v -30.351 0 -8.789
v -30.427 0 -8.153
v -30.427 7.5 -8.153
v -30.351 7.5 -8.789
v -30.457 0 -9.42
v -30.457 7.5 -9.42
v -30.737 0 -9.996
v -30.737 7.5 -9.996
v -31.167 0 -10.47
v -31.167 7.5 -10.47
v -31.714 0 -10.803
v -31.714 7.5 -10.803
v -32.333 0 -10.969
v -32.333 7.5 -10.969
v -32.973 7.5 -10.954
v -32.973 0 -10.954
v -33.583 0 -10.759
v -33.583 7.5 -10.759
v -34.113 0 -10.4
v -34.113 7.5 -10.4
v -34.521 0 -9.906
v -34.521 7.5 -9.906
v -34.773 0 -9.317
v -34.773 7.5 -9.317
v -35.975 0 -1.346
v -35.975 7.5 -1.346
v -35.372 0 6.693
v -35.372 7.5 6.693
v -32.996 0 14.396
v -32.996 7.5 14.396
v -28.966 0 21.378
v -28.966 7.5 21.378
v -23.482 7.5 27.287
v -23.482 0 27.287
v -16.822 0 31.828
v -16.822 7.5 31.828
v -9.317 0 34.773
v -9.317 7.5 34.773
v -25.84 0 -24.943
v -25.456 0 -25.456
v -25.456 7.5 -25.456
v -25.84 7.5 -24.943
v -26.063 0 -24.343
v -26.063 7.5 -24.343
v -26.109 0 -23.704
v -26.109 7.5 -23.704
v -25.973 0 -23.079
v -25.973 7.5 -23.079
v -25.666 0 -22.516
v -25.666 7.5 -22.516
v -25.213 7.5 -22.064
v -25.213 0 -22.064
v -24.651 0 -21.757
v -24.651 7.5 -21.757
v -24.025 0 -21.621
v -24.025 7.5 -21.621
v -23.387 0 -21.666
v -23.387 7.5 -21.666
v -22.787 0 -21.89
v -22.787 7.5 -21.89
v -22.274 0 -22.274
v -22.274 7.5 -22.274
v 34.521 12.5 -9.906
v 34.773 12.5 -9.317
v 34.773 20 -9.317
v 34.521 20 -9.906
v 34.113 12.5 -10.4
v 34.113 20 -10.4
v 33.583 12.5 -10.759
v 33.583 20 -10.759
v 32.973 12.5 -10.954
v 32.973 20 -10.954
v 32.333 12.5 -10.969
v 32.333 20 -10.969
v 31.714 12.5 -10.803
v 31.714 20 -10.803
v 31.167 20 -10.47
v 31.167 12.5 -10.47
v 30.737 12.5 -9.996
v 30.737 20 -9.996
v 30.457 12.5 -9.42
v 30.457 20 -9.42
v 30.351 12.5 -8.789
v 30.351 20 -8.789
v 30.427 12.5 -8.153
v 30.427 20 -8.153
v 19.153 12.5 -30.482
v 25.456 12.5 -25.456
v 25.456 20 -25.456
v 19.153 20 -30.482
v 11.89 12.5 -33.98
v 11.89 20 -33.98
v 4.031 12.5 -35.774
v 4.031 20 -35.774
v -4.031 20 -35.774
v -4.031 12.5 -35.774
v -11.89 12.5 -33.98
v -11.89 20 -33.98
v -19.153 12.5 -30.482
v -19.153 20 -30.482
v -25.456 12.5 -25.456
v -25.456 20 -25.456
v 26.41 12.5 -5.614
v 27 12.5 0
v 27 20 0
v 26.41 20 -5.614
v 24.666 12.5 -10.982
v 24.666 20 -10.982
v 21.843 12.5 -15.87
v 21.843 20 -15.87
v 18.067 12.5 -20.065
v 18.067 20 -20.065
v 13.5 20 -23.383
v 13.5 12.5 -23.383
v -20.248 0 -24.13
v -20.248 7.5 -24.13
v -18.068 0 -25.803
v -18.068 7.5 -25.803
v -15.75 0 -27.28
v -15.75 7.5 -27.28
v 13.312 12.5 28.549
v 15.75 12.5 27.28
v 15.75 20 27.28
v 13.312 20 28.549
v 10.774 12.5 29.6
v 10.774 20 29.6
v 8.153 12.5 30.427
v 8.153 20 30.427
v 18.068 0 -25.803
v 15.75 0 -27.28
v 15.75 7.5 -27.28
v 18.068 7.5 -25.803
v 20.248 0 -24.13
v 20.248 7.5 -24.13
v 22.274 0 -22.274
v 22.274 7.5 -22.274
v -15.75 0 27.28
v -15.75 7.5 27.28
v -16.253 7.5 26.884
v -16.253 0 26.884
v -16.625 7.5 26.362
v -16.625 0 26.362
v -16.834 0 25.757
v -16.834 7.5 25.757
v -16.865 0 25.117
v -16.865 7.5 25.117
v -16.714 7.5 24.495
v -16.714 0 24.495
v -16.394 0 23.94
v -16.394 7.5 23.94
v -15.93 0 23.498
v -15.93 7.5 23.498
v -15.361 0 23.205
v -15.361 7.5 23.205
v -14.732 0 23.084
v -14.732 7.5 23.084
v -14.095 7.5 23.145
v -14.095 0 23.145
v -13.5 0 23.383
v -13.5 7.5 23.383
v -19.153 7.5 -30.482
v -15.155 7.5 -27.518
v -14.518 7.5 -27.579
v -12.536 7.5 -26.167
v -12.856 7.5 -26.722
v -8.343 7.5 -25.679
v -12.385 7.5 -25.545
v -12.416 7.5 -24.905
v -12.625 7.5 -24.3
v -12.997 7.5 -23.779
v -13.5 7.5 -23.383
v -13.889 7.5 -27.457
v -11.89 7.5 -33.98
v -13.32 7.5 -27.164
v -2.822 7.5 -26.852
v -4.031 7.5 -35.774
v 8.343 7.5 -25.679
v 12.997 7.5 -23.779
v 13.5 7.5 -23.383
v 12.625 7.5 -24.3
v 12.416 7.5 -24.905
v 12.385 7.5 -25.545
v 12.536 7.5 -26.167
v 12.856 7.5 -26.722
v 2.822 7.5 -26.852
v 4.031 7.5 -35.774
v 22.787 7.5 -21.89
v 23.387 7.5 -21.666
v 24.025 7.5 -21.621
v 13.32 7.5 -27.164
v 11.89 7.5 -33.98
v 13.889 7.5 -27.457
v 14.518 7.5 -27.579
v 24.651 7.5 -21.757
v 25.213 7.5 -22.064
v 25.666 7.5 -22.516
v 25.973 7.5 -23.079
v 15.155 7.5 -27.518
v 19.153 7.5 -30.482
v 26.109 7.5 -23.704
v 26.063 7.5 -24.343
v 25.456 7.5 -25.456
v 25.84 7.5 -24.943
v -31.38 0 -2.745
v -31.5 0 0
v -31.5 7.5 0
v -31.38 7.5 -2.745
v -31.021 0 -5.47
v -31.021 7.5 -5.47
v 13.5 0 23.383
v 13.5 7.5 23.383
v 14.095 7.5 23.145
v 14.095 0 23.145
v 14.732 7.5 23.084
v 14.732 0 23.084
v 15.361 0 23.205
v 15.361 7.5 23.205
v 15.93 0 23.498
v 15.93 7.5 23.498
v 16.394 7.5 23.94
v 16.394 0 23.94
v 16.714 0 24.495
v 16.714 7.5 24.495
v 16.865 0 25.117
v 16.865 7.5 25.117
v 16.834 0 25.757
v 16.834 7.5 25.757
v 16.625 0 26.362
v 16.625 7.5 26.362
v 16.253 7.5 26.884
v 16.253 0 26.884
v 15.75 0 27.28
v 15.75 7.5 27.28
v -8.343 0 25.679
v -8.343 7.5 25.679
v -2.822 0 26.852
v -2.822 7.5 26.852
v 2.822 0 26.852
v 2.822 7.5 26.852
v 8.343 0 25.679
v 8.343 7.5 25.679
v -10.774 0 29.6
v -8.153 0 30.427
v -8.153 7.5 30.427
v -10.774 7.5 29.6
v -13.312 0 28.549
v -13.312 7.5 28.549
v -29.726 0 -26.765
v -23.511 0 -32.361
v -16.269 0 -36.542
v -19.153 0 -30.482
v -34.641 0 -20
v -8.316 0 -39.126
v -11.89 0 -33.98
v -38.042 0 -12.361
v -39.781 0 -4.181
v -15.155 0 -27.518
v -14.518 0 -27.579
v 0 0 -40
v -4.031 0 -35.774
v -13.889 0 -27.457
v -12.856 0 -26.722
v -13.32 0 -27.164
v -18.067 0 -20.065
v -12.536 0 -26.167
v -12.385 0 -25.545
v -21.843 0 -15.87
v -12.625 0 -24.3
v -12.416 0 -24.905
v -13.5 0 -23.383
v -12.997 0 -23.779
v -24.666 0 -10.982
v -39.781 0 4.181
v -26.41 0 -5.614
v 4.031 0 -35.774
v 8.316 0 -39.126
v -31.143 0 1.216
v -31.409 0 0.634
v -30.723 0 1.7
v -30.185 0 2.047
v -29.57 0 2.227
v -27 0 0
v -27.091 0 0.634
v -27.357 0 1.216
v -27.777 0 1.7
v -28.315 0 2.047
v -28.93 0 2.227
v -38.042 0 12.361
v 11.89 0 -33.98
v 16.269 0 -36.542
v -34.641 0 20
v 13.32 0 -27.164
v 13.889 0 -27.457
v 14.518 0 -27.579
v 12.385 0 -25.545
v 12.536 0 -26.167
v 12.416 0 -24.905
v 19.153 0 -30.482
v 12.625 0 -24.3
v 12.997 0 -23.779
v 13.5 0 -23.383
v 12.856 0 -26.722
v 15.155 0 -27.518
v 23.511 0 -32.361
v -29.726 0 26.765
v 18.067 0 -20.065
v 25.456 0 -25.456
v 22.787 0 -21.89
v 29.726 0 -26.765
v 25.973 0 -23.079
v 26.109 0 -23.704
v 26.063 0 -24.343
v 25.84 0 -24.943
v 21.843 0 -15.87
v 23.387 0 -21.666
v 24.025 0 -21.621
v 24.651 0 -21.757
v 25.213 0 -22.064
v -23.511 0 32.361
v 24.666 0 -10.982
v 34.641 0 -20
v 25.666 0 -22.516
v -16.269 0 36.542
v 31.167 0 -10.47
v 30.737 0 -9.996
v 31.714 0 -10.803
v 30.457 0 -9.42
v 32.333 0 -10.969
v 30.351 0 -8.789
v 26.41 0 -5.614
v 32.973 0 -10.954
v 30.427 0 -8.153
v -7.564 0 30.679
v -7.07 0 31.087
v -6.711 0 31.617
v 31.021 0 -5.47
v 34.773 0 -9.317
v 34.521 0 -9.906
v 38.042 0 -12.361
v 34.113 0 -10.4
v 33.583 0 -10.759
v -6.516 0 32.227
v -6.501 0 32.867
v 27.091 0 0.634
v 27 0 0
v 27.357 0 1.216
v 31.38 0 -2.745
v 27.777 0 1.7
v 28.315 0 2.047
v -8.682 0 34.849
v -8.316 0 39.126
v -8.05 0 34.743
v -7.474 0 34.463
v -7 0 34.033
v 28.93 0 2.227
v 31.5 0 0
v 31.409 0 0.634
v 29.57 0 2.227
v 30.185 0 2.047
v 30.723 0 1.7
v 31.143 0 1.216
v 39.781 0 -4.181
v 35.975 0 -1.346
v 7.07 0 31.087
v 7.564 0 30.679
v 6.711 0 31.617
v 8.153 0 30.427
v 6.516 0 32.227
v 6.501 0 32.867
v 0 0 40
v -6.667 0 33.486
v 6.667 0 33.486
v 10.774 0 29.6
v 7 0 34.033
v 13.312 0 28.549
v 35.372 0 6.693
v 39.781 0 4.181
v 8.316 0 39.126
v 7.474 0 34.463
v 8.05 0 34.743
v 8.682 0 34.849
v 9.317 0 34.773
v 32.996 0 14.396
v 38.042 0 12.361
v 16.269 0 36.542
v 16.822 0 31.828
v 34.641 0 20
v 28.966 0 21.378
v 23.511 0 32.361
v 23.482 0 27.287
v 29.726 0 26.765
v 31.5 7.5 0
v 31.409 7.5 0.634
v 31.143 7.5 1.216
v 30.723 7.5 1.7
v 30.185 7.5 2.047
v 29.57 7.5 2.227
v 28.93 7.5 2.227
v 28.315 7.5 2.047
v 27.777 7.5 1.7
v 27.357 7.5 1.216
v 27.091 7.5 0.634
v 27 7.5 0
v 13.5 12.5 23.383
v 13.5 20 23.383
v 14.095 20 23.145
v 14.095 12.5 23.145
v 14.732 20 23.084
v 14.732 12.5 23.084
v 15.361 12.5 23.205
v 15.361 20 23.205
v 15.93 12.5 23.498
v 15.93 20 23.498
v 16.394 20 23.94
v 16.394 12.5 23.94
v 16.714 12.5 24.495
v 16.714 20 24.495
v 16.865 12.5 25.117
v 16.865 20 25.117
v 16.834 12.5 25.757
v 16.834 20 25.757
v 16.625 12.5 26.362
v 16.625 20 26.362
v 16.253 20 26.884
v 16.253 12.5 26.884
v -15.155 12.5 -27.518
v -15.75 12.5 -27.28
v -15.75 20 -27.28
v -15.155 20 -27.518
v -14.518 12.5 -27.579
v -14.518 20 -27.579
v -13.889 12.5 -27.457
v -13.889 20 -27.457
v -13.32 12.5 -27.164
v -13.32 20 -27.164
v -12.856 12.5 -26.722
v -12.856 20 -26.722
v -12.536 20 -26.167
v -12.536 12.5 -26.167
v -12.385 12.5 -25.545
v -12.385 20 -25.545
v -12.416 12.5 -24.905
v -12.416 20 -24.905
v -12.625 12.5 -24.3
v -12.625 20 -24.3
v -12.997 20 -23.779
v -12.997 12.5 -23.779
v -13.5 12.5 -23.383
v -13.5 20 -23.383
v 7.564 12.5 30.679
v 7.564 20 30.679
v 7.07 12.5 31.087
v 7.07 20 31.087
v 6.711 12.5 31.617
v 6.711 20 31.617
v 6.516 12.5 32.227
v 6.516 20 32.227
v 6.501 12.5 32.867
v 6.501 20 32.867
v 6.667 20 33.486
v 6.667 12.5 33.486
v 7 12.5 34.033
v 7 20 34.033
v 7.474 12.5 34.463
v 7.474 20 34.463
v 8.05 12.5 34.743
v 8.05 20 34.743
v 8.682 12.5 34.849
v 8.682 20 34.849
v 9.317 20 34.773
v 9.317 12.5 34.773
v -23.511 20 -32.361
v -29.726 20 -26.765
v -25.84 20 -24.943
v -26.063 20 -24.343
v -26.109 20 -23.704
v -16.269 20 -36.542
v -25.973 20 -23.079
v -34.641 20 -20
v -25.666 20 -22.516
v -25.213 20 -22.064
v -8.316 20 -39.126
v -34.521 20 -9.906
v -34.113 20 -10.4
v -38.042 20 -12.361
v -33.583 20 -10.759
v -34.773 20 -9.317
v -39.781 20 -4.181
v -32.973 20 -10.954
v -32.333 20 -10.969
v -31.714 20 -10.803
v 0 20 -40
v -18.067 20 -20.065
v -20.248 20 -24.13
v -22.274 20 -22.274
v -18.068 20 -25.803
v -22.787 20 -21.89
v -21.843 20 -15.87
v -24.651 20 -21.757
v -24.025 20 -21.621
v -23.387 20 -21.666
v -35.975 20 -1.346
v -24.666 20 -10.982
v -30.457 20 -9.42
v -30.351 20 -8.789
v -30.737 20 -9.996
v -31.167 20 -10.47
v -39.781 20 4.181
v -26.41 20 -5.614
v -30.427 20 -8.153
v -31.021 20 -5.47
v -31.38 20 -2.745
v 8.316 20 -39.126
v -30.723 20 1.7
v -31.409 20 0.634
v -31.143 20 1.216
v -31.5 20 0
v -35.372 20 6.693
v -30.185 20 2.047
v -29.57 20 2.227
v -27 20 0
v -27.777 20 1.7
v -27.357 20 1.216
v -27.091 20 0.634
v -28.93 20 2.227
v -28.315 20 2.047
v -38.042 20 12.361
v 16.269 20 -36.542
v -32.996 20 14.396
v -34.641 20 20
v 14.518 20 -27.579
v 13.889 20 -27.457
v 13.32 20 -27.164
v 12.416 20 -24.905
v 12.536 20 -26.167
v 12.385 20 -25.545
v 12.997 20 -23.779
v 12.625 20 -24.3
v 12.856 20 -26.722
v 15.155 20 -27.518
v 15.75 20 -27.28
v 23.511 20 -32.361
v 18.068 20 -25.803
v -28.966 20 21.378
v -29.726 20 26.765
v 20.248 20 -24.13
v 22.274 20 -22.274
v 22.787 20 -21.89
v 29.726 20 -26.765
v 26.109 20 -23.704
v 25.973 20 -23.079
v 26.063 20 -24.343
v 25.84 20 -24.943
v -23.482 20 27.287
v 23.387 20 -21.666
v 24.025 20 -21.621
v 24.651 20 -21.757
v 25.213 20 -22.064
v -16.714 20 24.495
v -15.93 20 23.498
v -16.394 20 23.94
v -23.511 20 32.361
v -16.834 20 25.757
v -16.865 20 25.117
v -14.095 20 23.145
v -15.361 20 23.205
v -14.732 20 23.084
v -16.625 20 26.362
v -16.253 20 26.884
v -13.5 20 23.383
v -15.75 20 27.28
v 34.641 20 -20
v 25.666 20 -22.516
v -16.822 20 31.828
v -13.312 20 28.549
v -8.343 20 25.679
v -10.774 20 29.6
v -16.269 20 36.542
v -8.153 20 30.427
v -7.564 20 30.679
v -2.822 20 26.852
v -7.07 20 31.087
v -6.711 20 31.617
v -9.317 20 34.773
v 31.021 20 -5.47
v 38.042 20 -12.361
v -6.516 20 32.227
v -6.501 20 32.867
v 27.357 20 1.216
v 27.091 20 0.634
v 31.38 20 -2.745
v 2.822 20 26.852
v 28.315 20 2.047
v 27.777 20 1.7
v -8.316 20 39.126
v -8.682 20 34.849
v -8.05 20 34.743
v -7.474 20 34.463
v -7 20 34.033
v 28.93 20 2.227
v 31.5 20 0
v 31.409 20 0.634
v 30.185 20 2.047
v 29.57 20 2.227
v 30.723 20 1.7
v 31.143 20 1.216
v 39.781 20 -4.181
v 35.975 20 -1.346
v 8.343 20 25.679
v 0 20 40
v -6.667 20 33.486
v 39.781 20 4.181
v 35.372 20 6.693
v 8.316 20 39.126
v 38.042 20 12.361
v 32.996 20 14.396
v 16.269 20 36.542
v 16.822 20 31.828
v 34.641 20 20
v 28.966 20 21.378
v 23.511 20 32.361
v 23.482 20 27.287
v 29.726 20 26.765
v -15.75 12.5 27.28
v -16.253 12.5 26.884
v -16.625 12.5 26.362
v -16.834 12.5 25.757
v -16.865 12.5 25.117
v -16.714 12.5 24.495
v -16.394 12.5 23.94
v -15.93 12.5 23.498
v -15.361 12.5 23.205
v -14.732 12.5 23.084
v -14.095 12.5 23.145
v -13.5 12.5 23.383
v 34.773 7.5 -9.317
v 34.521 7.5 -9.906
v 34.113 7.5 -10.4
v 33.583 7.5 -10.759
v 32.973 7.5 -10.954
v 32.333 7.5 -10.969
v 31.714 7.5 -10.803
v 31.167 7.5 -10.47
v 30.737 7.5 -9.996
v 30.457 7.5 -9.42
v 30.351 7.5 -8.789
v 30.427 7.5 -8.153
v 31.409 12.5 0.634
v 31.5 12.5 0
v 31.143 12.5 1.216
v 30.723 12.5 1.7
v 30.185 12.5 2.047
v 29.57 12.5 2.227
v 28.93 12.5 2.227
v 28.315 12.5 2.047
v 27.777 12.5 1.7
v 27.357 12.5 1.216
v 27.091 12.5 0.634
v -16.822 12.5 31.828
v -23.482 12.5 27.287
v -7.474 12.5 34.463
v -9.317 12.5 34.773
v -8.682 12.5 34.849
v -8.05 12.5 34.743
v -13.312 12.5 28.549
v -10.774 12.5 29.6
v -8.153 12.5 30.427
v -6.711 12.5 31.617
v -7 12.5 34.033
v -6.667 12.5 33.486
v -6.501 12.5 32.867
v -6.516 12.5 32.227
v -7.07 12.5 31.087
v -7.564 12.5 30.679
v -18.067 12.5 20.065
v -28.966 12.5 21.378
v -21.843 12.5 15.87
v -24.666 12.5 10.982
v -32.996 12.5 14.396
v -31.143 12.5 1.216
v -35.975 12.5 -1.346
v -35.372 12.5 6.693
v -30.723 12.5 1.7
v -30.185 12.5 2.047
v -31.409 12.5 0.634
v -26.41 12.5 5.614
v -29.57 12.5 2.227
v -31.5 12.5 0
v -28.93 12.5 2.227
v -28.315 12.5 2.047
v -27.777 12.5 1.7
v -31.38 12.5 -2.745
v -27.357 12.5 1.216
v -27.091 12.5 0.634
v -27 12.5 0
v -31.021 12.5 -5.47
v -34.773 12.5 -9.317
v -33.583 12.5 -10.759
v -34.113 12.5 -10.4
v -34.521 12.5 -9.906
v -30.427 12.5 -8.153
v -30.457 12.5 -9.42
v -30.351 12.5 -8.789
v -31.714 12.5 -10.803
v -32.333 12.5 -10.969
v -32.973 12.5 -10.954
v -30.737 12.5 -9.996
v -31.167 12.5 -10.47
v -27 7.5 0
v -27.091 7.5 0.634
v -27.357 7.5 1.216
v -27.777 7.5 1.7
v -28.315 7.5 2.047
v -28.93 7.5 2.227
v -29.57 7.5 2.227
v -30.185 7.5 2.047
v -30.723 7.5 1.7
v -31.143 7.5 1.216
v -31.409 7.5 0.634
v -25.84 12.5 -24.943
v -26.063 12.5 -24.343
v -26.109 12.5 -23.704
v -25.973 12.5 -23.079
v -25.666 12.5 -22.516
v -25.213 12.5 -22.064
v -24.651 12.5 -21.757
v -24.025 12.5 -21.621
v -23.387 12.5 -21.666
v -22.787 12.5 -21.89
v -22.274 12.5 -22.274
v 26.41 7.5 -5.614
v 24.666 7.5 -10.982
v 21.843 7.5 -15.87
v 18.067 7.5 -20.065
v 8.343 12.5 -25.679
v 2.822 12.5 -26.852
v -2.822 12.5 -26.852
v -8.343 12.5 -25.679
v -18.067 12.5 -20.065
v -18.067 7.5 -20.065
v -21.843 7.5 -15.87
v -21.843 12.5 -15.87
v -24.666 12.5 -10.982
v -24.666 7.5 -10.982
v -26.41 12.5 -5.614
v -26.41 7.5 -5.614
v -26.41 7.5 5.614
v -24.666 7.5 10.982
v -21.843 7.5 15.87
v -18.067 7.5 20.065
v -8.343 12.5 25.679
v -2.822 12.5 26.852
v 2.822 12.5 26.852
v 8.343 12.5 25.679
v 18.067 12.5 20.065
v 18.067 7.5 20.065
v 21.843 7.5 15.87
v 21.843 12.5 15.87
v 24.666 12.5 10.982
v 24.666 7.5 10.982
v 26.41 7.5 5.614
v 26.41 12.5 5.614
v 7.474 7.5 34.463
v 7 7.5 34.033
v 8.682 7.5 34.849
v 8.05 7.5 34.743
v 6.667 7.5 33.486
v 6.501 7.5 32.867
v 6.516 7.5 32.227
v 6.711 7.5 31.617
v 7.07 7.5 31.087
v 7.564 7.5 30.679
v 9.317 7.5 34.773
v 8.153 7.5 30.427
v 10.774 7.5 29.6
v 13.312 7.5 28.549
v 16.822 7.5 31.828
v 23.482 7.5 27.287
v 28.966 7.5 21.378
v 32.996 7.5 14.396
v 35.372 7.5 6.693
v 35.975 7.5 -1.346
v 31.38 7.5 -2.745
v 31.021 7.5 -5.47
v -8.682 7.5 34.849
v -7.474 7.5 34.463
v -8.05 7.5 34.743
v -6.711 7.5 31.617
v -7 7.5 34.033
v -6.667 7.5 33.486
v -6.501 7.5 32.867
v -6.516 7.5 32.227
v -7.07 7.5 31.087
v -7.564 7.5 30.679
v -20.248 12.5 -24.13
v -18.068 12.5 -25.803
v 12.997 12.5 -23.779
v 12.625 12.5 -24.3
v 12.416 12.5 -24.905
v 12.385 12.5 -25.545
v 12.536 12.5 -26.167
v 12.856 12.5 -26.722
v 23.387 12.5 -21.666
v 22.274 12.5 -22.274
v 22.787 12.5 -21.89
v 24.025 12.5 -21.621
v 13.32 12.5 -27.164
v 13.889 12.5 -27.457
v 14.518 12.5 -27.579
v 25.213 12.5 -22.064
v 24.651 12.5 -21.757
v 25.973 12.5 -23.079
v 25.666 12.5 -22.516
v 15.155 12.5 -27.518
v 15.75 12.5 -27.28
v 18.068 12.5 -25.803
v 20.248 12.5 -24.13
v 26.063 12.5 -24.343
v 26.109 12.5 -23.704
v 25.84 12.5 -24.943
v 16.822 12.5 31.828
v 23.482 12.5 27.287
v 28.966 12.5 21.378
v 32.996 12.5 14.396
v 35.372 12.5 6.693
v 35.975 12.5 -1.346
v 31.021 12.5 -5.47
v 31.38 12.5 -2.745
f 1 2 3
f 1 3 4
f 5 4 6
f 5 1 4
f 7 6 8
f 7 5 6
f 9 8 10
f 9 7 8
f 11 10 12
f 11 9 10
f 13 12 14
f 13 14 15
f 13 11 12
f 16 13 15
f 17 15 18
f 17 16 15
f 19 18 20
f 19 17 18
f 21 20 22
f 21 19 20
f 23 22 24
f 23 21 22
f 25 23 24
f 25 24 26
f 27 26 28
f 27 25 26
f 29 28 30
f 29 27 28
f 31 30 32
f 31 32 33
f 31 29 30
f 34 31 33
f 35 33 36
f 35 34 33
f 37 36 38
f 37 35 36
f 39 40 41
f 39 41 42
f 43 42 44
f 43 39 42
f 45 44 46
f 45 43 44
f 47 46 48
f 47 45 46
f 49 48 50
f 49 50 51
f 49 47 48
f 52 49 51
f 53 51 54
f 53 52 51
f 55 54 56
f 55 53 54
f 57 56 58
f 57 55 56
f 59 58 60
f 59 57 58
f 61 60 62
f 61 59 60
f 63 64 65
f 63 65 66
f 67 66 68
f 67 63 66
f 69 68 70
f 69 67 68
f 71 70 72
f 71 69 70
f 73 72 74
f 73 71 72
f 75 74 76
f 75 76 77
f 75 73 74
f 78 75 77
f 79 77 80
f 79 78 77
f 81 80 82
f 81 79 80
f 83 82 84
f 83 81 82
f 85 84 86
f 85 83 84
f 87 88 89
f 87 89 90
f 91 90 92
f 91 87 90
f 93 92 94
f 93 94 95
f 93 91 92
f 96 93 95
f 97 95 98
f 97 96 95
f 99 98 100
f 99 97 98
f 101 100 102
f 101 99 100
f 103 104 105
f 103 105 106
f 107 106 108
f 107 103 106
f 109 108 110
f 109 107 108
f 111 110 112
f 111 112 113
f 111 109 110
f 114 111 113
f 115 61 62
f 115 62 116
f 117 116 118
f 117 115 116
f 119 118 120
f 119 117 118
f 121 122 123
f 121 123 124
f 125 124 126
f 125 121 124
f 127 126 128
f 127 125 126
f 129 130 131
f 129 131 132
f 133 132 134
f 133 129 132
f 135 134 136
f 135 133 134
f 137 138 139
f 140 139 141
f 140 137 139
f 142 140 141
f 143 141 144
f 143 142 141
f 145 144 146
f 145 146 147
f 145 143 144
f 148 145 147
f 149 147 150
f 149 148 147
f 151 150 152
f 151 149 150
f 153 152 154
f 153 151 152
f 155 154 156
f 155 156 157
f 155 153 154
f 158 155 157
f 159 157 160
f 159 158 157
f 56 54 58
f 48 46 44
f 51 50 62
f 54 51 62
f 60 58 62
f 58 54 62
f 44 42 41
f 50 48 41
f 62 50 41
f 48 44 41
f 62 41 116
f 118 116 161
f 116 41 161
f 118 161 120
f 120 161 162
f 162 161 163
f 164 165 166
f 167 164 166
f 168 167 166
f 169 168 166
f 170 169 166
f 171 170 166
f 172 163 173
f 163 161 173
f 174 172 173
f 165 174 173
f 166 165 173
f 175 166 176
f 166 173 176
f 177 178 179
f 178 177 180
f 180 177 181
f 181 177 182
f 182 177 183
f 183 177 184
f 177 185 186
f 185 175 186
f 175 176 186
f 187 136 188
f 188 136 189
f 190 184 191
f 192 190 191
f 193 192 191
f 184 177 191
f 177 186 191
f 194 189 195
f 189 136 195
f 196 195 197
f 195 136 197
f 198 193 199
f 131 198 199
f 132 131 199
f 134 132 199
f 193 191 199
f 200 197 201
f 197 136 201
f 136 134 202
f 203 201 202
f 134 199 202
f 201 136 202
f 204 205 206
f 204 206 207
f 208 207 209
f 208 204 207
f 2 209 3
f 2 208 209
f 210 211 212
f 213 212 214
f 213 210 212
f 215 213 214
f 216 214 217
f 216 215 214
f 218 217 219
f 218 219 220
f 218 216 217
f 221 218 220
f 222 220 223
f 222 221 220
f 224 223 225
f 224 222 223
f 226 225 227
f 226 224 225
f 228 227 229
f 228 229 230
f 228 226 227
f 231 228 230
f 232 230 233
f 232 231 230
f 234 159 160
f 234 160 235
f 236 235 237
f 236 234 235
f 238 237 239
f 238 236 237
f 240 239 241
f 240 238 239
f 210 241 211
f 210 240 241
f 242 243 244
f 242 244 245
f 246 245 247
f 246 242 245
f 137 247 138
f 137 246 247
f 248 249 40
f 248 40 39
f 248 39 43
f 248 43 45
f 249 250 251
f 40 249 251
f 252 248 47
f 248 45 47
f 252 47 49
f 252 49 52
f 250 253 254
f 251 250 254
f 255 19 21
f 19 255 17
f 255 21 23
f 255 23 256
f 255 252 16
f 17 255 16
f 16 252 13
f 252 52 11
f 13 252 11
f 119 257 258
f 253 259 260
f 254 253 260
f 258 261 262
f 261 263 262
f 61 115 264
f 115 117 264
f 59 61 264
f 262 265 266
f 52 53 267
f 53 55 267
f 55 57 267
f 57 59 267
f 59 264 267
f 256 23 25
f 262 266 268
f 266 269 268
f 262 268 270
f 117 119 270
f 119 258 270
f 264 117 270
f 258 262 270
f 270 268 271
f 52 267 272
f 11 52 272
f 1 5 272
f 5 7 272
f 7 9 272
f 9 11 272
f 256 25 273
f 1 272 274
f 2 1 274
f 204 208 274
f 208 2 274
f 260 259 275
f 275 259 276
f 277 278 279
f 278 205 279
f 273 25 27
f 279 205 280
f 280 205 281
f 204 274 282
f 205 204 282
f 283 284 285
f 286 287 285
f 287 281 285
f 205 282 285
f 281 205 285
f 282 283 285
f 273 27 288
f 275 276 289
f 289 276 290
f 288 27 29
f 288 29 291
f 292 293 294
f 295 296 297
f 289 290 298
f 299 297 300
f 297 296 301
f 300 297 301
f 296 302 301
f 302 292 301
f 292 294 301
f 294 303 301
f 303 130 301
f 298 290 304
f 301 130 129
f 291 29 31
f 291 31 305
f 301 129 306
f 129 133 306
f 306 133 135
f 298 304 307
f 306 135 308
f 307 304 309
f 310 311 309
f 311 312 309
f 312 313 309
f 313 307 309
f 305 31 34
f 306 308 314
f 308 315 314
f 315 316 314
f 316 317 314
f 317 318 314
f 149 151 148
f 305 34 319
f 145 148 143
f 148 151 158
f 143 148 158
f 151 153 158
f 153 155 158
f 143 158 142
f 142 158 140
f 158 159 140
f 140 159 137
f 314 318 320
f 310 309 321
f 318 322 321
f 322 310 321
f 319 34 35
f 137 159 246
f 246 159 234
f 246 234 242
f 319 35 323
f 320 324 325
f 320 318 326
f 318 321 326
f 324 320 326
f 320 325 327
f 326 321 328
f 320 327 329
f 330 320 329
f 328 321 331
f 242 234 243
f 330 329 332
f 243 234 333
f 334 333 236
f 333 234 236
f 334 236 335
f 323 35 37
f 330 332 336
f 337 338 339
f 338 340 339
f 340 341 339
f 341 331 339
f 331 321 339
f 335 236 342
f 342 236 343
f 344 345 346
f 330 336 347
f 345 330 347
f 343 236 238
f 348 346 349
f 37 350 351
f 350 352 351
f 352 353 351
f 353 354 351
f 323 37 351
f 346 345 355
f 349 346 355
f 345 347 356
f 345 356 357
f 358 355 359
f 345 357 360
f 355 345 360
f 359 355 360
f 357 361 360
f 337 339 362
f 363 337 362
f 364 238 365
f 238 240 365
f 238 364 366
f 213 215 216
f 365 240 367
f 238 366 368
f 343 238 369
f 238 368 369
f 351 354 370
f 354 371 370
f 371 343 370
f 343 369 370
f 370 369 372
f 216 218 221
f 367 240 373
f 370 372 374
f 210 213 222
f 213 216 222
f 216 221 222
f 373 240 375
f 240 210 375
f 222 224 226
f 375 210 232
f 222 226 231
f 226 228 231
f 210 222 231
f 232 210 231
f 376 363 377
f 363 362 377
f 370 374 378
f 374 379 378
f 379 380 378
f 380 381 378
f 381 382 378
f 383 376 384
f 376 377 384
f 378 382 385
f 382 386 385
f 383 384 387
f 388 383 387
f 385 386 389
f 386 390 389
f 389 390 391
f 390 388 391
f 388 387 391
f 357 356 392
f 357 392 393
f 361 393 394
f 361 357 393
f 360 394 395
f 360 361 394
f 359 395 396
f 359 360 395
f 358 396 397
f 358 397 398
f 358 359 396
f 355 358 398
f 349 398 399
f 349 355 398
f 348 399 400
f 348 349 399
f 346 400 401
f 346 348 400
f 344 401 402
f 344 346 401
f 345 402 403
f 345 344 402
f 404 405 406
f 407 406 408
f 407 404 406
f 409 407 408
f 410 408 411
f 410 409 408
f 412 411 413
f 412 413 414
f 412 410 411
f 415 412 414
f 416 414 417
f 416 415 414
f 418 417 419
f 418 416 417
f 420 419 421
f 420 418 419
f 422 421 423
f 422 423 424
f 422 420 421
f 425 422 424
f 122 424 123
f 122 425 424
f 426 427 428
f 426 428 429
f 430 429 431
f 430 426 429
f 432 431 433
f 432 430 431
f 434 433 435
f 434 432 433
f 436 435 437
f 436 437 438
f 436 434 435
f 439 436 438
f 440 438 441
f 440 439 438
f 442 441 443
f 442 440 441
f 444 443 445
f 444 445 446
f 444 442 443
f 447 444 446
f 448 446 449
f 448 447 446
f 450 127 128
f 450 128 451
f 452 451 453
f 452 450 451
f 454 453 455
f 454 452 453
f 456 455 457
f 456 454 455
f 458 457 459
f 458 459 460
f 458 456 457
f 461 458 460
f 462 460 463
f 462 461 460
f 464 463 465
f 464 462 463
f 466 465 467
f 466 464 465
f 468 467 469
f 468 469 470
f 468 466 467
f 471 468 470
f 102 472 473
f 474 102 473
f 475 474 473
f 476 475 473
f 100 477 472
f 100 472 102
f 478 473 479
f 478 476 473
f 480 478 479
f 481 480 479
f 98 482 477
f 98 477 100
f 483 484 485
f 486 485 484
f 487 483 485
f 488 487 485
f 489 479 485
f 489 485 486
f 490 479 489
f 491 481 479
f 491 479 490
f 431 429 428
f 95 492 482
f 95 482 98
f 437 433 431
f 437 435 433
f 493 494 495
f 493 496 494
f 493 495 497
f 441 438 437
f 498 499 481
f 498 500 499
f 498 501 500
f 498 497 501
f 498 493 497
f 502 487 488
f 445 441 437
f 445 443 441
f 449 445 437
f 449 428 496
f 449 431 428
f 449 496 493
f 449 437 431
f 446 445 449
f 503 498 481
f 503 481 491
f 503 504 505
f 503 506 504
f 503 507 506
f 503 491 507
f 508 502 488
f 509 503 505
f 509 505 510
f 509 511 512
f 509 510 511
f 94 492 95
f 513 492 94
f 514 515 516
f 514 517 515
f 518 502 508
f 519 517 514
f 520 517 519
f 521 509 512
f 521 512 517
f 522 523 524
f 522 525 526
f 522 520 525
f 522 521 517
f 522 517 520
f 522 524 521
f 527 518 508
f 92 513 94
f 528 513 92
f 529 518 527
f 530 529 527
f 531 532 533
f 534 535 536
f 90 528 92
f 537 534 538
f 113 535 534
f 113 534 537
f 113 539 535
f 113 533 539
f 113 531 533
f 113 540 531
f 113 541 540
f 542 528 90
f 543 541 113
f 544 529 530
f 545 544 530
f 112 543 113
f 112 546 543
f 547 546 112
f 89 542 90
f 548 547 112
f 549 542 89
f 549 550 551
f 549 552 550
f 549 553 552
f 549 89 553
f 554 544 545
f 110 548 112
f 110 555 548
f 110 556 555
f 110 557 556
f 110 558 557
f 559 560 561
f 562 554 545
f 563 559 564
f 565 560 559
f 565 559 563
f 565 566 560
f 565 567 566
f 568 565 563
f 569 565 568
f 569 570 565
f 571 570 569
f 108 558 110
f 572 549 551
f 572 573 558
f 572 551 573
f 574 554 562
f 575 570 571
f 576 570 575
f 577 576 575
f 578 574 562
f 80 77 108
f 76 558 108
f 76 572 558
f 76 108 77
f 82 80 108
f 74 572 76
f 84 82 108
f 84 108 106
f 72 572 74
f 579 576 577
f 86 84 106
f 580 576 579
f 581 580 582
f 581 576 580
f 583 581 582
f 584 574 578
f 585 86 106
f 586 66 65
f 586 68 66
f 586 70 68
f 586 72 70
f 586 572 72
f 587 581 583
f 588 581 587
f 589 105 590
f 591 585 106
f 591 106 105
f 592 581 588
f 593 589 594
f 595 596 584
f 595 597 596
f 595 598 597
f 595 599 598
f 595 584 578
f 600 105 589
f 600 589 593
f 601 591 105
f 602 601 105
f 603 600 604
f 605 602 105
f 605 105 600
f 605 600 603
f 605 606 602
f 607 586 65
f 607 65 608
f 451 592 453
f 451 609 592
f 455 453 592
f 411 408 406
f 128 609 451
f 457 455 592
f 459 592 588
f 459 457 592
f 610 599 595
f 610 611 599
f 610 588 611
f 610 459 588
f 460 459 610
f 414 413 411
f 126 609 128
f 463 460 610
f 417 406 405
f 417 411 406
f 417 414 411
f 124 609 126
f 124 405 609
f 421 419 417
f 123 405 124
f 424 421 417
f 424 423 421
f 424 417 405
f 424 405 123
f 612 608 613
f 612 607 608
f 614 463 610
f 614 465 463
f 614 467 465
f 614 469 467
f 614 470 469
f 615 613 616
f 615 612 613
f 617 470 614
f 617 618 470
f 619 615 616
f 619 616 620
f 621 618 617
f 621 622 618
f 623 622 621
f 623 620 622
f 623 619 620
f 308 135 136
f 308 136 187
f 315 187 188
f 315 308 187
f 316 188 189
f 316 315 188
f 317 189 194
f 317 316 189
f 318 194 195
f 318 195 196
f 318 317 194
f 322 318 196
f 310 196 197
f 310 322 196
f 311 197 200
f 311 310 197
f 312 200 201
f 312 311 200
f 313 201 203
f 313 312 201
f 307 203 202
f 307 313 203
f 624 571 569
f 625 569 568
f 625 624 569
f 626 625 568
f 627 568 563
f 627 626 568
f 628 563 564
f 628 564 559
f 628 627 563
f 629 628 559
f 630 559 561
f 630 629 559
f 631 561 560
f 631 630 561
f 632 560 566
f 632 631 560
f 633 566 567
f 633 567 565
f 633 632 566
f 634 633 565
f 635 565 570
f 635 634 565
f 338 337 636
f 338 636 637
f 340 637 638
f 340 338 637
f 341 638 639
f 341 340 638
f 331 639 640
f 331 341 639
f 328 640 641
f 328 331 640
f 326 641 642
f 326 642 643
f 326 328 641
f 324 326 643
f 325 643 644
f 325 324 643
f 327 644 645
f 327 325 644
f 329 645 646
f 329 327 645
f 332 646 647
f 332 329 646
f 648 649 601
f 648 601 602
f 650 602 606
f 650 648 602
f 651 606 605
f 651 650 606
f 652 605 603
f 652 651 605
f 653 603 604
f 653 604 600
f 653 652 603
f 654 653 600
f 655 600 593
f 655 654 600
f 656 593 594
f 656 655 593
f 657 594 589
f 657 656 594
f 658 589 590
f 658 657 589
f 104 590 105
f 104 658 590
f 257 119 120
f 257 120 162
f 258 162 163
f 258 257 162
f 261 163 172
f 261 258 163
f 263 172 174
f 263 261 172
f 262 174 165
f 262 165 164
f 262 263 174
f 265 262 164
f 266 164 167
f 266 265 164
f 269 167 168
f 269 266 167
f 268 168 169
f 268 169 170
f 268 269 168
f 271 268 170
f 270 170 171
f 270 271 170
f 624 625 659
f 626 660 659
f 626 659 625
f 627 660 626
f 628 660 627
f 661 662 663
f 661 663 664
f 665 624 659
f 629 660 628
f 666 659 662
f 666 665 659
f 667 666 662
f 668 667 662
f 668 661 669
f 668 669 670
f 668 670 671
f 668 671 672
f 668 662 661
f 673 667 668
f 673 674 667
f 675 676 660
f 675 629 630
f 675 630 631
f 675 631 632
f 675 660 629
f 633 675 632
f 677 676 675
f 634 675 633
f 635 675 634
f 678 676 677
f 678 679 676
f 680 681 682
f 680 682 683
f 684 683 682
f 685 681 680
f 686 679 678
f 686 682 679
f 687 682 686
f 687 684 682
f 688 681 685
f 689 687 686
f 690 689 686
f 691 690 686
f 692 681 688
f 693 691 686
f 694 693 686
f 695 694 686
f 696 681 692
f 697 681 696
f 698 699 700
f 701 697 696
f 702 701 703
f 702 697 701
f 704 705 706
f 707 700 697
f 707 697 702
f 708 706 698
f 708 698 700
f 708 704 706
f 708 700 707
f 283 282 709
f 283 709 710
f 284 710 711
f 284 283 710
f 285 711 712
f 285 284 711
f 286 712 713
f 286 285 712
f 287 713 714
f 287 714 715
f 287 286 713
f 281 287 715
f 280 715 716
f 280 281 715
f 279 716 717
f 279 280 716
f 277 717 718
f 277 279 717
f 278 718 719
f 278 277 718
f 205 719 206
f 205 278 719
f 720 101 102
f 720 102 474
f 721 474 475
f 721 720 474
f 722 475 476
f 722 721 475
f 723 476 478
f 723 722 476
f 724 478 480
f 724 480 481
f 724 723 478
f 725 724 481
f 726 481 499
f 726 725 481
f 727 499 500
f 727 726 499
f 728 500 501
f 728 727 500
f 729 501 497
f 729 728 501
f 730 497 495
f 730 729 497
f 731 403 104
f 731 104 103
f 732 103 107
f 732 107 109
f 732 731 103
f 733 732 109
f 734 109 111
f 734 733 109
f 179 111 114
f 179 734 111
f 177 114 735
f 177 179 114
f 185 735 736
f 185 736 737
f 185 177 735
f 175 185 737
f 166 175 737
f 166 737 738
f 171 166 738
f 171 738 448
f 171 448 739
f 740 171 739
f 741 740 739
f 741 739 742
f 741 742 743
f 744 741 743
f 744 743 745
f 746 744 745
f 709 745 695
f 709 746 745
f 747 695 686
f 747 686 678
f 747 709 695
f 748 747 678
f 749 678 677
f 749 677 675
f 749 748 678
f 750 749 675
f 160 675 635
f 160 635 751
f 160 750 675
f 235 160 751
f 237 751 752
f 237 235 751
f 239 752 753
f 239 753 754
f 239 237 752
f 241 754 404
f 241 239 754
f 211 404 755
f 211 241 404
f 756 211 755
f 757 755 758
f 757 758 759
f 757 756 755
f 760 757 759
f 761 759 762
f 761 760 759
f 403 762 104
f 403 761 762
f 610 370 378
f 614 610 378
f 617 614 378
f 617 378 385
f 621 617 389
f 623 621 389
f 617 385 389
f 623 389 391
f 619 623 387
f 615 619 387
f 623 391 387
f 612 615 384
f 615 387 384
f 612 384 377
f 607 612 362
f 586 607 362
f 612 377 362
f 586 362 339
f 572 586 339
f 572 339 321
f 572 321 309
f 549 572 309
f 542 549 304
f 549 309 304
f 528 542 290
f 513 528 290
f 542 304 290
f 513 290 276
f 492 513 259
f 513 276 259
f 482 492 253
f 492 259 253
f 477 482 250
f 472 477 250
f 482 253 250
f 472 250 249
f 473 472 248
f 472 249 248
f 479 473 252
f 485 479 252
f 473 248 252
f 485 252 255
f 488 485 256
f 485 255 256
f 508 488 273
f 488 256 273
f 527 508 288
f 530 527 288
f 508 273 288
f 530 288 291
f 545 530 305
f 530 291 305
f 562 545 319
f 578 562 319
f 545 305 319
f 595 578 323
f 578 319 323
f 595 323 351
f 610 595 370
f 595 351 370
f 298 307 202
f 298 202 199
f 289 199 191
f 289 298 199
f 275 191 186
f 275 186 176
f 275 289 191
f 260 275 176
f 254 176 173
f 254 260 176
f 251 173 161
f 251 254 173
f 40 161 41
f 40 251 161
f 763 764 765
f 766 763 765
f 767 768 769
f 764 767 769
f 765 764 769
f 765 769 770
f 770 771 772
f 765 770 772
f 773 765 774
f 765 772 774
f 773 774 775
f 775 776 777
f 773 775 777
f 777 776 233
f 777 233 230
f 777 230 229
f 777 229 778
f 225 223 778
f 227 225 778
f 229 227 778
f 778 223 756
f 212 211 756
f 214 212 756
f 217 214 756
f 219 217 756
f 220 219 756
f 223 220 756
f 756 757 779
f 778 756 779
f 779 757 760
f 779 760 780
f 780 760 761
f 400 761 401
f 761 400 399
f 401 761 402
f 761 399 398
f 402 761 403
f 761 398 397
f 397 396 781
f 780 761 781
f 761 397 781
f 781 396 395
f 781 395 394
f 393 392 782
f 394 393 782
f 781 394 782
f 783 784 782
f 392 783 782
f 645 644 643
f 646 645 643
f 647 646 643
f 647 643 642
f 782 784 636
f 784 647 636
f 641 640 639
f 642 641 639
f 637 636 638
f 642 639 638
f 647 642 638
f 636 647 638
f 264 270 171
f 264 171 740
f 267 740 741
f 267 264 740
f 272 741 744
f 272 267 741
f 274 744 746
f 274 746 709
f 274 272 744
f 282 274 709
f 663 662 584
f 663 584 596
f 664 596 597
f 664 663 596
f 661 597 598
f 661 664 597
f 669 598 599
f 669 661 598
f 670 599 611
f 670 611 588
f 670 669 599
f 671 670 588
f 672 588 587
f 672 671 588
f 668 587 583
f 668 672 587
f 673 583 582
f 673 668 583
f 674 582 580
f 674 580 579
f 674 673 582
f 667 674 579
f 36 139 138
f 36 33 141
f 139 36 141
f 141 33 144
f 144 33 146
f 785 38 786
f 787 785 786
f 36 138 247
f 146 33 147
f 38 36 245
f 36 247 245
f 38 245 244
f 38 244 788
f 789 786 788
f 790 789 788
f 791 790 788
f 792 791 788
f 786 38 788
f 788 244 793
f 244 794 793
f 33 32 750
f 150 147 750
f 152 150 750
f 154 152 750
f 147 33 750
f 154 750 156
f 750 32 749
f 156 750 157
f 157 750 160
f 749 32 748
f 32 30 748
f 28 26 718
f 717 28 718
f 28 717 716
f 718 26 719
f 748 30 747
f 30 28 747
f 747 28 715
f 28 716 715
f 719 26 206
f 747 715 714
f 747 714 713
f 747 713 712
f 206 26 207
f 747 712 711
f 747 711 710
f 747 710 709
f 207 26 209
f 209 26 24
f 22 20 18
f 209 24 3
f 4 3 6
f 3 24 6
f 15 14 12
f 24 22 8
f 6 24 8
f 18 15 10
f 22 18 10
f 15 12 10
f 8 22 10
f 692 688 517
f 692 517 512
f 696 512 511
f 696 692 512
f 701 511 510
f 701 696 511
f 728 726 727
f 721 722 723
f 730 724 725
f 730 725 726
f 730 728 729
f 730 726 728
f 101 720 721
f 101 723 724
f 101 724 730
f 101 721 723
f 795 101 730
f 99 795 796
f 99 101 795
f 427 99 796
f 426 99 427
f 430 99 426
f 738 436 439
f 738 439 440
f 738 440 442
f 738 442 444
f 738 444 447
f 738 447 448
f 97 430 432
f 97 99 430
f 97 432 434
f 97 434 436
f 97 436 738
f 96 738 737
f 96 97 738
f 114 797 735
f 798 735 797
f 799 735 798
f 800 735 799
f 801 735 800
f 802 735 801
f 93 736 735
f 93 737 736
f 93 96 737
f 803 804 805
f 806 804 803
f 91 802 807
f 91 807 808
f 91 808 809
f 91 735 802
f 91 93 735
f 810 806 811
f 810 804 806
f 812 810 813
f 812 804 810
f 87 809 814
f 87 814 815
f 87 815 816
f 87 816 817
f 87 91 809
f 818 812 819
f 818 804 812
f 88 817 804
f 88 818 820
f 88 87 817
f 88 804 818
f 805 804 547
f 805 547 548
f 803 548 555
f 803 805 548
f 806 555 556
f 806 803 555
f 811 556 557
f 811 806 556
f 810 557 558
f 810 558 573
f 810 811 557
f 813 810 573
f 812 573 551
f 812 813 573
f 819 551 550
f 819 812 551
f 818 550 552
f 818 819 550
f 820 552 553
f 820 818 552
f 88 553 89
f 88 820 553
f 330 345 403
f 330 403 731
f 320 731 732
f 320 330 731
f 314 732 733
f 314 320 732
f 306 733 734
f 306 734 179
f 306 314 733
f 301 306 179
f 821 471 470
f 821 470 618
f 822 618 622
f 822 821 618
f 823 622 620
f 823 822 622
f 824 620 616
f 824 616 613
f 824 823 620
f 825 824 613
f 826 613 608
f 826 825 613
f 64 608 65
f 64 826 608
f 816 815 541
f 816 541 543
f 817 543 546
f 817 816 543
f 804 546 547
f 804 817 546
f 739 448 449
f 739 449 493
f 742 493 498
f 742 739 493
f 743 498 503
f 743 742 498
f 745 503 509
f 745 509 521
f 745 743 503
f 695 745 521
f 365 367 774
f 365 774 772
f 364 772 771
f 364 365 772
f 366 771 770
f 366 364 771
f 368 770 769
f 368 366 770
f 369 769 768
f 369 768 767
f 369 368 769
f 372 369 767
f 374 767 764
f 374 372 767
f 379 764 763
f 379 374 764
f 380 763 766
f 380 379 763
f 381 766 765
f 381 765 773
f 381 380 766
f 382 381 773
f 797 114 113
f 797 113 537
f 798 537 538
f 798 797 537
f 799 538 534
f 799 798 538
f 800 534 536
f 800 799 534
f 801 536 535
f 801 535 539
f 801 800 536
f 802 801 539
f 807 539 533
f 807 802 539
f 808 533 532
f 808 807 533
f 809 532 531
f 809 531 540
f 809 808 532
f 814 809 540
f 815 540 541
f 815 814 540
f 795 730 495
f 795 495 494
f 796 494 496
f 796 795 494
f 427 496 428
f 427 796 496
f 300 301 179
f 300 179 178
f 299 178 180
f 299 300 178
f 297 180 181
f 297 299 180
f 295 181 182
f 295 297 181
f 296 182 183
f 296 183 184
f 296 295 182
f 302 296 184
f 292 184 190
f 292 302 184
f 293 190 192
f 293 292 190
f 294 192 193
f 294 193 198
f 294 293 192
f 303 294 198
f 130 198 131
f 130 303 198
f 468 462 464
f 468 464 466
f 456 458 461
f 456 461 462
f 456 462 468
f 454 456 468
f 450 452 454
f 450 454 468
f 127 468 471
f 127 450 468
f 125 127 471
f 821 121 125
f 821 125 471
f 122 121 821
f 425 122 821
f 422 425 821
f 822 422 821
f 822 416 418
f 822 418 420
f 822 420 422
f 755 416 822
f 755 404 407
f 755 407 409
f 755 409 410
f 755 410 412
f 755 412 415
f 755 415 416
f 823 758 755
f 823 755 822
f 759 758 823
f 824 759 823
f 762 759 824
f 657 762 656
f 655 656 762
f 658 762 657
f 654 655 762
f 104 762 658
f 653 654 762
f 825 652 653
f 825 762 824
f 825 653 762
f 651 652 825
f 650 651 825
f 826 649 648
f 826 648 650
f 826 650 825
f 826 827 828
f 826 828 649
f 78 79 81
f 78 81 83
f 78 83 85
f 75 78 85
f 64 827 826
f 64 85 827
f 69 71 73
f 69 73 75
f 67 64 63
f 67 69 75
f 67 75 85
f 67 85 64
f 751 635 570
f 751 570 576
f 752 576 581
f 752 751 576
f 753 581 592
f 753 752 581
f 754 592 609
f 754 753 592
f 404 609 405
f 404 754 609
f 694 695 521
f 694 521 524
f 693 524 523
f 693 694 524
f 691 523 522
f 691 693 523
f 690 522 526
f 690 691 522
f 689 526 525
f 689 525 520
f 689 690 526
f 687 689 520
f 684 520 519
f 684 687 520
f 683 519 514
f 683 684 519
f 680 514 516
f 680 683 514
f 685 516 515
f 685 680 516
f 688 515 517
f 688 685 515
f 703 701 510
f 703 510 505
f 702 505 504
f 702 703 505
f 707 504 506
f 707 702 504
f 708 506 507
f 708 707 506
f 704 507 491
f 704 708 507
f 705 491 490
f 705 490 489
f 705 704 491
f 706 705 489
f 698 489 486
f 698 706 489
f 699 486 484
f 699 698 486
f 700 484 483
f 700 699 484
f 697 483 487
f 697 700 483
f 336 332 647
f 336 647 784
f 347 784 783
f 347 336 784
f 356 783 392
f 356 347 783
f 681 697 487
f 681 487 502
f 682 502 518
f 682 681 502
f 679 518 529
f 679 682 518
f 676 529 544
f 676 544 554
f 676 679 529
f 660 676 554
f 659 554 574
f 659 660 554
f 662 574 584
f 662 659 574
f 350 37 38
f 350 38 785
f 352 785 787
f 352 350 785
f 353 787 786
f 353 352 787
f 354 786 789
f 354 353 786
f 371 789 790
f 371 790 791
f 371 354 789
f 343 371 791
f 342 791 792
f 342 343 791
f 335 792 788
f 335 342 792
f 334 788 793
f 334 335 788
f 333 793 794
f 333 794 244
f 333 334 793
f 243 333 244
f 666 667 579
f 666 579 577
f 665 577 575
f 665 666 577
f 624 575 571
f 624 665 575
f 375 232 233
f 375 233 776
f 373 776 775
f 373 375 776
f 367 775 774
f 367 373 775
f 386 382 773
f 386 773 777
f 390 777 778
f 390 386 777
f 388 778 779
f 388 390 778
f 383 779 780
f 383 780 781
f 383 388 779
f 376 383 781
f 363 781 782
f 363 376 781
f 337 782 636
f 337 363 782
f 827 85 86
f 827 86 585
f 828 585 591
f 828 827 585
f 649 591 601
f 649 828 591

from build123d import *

# Parameters (mm, degrees)
ESQUISSE1_R              = 40
ESQUISSE1_R_2            = 25
BOSS_EXTRU_1_DEPTH       = 20
EMPREINTE1_OUTLINE_R     = 25
EMPREINTE1_DEPTH         = 7.5
EMPREINTE1_START         = 12.5
EMPREINTE1_2_OUTLINE_R   = 25
EMPREINTE1_2_DEPTH       = 7.5
EMPREINTE1_START_2       = 7.5
EMPREINTE1_3_OUTLINE_R   = 27
EMPREINTE1_3_OUTLINE_R_2 = 25
EMPREINTE1_3_DEPTH       = 5


# Read off the part's stored shape, not the designer's step: Empreinte1
with BuildPart() as part:
    # Esquisse1 → Boss.-Extru.1 (new body)
    with BuildSketch(Plane(origin=(0, 0, 0), x_dir=(1, 0, 0), z_dir=(0, 1, 0))):
        with Locations(Location((0, 0, 0), (0, 0, 270))):
            Circle(ESQUISSE1_R)
        with Locations(Location((0, 0, 0), (0, 0, 270))):
            Circle(ESQUISSE1_R_2, mode=Mode.SUBTRACT)
    extrude(amount=BOSS_EXTRU_1_DEPTH)

    # Empreinte1 outline → Empreinte1 (cut)
    with BuildSketch(Plane(origin=(0, 0, 0), x_dir=(1, 0, 0), z_dir=(0, 1, 0))):
        with BuildLine():
            ThreePointArc((-15.75, 27.279800219), (-12.676442841, 26.456243061), (-13.5, 23.382685902))
            ThreePointArc((-13.5, 23.382685902), (-23.382685902, 13.5), (-27, 0))
            ThreePointArc((-27, 0), (-29.25, -2.25), (-31.5, 0))
            ThreePointArc((-31.5, 0), (-31.230513133, 4.111575055), (-30.426663528, 8.152799921))
            ThreePointArc((-30.426663528, 8.152799921), (-32.017653786, 10.908475881), (-34.773329746, 9.317485624))
            ThreePointArc((-34.773329746, 9.317485624), (-31.176914536, -18), (-9.317485624, -34.773329746))
            ThreePointArc((-9.317485624, -34.773329746), (-6.561809663, -33.182339489), (-8.152799921, -30.426663528))
            ThreePointArc((-8.152799921, -30.426663528), (-12.05452812, -29.102205274), (-15.75, -27.279800219))
            ThreePointArc((-15.75, -27.279800219), (-16.573557159, -24.20624306), (-13.5, -23.382685902))
            ThreePointArc((-13.5, -23.382685902), (0, -27), (13.5, -23.382685902))
            ThreePointArc((13.5, -23.382685902), (16.573557159, -24.20624306), (15.75, -27.279800219))
            ThreePointArc((15.75, -27.279800219), (12.05452812, -29.102205274), (8.152799921, -30.426663528))
            ThreePointArc((8.152799921, -30.426663528), (6.561809663, -33.182339489), (9.317485624, -34.773329746))
            ThreePointArc((9.317485624, -34.773329746), (31.176914536, -18), (34.773329746, 9.317485624))
            ThreePointArc((34.773329746, 9.317485624), (32.017653786, 10.908475881), (30.426663528, 8.152799921))
            ThreePointArc((30.426663528, 8.152799921), (31.230513133, 4.111575055), (31.5, 0))
            ThreePointArc((31.5, 0), (29.25, -2.25), (27, 0))
            ThreePointArc((27, 0), (23.382685902, 13.5), (13.5, 23.382685902))
            ThreePointArc((13.5, 23.382685902), (12.676442841, 26.456243061), (15.75, 27.279800219))
            ThreePointArc((15.75, 27.279800219), (19.175985014, 24.990630219), (22.273863607, 22.273863607))
            ThreePointArc((22.273863607, 22.273863607), (25.455844123, 22.273863607), (25.455844123, 25.455844123))
            ThreePointArc((25.455844123, 25.455844123), (0, 36), (-25.455844123, 25.455844123))
            ThreePointArc((-25.455844123, 25.455844123), (-25.455844123, 22.273863607), (-22.273863607, 22.273863607))
            ThreePointArc((-22.273863607, 22.273863607), (-19.175985014, 24.990630219), (-15.75, 27.279800219))
        make_face()
        Circle(EMPREINTE1_OUTLINE_R, mode=Mode.SUBTRACT)
    extrude(amount=EMPREINTE1_DEPTH, mode=Mode.SUBTRACT)

    # Empreinte1 2 outline → Empreinte1 2 (cut)
    with BuildSketch(Plane(origin=(0, 0, 0), x_dir=(1, 0, 0), z_dir=(0, 1, 0)).offset(EMPREINTE1_START)):
        with BuildLine():
            ThreePointArc((-15.75, 27.279800219), (-12.676442841, 26.456243061), (-13.5, 23.382685902))
            ThreePointArc((-13.5, 23.382685902), (-23.382685902, 13.5), (-27, 0))
            ThreePointArc((-27, 0), (-29.25, -2.25), (-31.5, 0))
            ThreePointArc((-31.5, 0), (-31.230513133, 4.111575055), (-30.426663528, 8.152799921))
            ThreePointArc((-30.426663528, 8.152799921), (-32.017653786, 10.908475881), (-34.773329746, 9.317485624))
            ThreePointArc((-34.773329746, 9.317485624), (-31.176914536, -18), (-9.317485624, -34.773329746))
            ThreePointArc((-9.317485624, -34.773329746), (-6.561809663, -33.182339489), (-8.152799921, -30.426663528))
            ThreePointArc((-8.152799921, -30.426663528), (-12.05452812, -29.102205274), (-15.75, -27.279800219))
            ThreePointArc((-15.75, -27.279800219), (-16.573557159, -24.20624306), (-13.5, -23.382685902))
            ThreePointArc((-13.5, -23.382685902), (0, -27), (13.5, -23.382685902))
            ThreePointArc((13.5, -23.382685902), (16.573557159, -24.20624306), (15.75, -27.279800219))
            ThreePointArc((15.75, -27.279800219), (12.05452812, -29.102205274), (8.152799921, -30.426663528))
            ThreePointArc((8.152799921, -30.426663528), (6.561809663, -33.182339489), (9.317485624, -34.773329746))
            ThreePointArc((9.317485624, -34.773329746), (31.176914536, -18), (34.773329746, 9.317485624))
            ThreePointArc((34.773329746, 9.317485624), (32.017653786, 10.908475881), (30.426663528, 8.152799921))
            ThreePointArc((30.426663528, 8.152799921), (31.230513133, 4.111575055), (31.5, 0))
            ThreePointArc((31.5, 0), (29.25, -2.25), (27, 0))
            ThreePointArc((27, 0), (23.382685902, 13.5), (13.5, 23.382685902))
            ThreePointArc((13.5, 23.382685902), (12.676442841, 26.456243061), (15.75, 27.279800219))
            ThreePointArc((15.75, 27.279800219), (19.175985014, 24.990630219), (22.273863607, 22.273863607))
            ThreePointArc((22.273863607, 22.273863607), (25.455844123, 22.273863607), (25.455844123, 25.455844123))
            ThreePointArc((25.455844123, 25.455844123), (0, 36), (-25.455844123, 25.455844123))
            ThreePointArc((-25.455844123, 25.455844123), (-25.455844123, 22.273863607), (-22.273863607, 22.273863607))
            ThreePointArc((-22.273863607, 22.273863607), (-19.175985014, 24.990630219), (-15.75, 27.279800219))
        make_face()
        Circle(EMPREINTE1_2_OUTLINE_R, mode=Mode.SUBTRACT)
    extrude(amount=EMPREINTE1_2_DEPTH, mode=Mode.SUBTRACT)

    # Empreinte1 3 outline → Empreinte1 3 (cut)
    with BuildSketch(Plane(origin=(0, 0, 0), x_dir=(1, 0, 0), z_dir=(0, 1, 0)).offset(EMPREINTE1_START_2)):
        Circle(EMPREINTE1_3_OUTLINE_R)
        Circle(EMPREINTE1_3_OUTLINE_R_2, mode=Mode.SUBTRACT)
    extrude(amount=EMPREINTE1_3_DEPTH, mode=Mode.SUBTRACT)


solid = part.part
